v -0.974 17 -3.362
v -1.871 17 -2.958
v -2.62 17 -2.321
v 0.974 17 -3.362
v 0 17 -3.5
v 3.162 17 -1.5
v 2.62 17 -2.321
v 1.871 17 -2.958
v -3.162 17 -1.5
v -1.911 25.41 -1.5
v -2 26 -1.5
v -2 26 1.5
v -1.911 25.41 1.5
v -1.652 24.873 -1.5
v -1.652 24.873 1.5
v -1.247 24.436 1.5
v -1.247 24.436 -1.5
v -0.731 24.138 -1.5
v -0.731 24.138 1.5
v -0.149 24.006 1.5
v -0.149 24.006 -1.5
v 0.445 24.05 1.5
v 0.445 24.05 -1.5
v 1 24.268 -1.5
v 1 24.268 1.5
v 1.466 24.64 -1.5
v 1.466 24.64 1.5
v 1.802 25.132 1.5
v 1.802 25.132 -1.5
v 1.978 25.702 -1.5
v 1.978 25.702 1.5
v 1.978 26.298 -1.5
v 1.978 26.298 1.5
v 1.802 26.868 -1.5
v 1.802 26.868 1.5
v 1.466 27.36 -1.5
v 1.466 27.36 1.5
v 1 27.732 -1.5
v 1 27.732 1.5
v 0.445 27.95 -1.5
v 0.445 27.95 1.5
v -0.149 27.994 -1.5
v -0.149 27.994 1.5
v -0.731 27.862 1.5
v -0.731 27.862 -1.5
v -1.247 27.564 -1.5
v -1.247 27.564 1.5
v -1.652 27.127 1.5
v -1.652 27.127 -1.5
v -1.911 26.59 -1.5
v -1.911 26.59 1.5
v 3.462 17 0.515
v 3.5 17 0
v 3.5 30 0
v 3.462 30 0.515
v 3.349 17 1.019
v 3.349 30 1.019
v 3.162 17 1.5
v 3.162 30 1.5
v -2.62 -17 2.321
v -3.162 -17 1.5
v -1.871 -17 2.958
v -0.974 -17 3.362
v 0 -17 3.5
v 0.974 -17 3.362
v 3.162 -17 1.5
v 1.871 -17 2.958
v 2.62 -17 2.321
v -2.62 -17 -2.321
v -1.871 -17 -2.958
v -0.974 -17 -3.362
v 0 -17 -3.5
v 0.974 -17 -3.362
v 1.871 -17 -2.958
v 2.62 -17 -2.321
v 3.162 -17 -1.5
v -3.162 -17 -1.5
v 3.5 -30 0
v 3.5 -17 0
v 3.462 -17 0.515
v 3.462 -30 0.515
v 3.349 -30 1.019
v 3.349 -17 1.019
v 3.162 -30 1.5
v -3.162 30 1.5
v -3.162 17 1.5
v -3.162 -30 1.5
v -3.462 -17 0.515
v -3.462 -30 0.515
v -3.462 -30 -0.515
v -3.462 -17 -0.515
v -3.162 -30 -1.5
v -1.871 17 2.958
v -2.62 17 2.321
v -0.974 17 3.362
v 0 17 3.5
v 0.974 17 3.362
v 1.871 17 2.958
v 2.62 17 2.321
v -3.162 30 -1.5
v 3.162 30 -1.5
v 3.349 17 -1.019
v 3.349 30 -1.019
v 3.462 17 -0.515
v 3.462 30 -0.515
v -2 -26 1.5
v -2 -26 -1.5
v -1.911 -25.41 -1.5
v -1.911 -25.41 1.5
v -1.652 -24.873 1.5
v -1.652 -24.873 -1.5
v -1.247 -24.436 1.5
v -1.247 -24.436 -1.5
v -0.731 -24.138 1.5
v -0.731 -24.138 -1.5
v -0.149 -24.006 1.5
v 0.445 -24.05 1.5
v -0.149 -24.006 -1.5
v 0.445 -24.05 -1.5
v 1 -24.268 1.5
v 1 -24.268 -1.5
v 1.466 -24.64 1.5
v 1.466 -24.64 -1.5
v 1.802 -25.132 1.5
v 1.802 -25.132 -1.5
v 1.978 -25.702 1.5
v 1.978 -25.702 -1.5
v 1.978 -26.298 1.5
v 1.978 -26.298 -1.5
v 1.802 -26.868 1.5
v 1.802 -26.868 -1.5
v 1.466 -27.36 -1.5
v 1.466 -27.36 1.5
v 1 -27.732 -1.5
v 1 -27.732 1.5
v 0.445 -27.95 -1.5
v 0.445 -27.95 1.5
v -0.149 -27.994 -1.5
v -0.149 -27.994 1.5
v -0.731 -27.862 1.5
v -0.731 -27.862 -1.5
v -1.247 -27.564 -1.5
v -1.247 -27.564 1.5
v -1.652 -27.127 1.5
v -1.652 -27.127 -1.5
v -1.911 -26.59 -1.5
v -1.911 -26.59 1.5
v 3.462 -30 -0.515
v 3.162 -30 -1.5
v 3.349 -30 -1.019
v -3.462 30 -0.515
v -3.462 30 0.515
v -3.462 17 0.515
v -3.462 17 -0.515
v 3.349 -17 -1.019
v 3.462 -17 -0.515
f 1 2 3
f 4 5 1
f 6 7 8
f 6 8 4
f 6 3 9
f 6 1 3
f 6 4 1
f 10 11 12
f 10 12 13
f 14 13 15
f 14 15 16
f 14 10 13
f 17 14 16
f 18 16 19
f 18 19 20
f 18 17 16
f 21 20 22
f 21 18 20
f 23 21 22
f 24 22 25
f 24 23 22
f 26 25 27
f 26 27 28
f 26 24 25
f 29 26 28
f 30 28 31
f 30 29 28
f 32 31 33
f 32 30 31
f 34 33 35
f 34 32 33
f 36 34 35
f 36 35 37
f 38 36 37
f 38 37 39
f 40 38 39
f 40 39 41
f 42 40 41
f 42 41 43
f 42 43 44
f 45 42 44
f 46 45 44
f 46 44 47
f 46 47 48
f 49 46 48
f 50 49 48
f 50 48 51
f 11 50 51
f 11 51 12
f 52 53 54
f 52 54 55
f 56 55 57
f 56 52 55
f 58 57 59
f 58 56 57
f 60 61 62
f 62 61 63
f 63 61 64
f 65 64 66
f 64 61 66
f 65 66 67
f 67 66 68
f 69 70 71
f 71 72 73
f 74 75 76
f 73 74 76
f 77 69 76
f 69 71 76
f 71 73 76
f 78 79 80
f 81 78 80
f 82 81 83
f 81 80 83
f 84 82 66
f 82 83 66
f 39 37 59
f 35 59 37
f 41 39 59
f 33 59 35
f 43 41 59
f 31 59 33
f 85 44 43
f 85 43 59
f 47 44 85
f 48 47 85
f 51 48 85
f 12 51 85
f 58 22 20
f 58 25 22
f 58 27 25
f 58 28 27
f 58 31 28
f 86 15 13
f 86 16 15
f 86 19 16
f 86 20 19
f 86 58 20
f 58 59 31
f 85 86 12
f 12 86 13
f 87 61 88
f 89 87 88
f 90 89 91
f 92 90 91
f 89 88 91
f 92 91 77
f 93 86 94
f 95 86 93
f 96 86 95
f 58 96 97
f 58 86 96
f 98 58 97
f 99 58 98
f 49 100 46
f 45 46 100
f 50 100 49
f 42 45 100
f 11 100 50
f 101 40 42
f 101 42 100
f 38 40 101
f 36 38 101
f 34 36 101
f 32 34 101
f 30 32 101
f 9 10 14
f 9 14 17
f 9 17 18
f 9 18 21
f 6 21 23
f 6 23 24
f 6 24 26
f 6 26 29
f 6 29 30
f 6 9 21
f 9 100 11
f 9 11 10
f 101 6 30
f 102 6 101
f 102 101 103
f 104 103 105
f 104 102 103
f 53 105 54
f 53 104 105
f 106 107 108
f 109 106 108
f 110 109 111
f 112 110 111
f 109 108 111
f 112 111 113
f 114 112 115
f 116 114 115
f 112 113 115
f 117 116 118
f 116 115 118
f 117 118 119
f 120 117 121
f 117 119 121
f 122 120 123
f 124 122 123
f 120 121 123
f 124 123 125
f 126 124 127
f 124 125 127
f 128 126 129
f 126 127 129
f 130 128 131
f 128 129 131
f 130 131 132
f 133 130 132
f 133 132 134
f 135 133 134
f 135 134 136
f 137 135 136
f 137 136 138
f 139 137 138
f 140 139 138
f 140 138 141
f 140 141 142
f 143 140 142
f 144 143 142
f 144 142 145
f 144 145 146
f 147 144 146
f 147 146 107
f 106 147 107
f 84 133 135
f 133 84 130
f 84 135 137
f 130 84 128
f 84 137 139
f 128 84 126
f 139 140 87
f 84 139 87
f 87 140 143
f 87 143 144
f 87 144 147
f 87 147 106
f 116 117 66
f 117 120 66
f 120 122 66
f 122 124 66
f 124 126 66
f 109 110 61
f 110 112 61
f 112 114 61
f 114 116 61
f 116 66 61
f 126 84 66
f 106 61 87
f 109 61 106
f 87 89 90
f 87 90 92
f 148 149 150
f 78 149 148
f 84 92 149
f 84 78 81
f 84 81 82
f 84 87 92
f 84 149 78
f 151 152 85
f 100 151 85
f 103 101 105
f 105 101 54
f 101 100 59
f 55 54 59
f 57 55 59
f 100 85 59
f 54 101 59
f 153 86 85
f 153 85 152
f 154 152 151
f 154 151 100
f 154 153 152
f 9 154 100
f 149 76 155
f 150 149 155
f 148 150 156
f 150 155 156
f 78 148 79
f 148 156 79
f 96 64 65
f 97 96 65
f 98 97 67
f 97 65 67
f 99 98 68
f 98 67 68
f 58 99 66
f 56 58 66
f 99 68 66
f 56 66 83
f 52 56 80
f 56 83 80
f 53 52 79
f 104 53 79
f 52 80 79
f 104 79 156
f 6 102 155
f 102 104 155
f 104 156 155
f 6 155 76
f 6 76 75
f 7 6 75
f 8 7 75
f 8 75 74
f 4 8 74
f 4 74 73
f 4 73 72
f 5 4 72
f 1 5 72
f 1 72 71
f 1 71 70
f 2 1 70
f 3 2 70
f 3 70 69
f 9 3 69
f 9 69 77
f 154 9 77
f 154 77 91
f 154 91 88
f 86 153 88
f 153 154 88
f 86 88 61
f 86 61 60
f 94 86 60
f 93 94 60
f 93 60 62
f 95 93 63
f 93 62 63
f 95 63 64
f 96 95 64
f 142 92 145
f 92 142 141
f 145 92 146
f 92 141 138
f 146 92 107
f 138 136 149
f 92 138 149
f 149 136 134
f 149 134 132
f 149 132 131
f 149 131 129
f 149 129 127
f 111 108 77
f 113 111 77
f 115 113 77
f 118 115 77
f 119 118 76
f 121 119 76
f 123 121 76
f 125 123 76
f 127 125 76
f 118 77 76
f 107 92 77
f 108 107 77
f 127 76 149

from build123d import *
from build123d.topology import SkipClean

# Parameters (mm, degrees)
EXTRUDE_1_DEPTH      = 17
EXTRUDE_1_DEPTH_BACK = 17
SKETCH_1_R           = 3.5
EXTRUDE_2_DEPTH      = 13
CUT_EXTRUDE_1_REACH  = 32.615
SKETCH_5_R           = 2


with BuildPart() as part:
    # 草图1 → 凸台-拉伸1 (new, two sides: drawn at the far end of the back side and taken through both)
    with BuildSketch(Plane(origin=(0, 0, 0), x_dir=(1, 0, 0), z_dir=(0, 1, 0)).offset(-EXTRUDE_1_DEPTH_BACK)):
        Circle(SKETCH_1_R)
    extrude(amount=EXTRUDE_1_DEPTH + EXTRUDE_1_DEPTH_BACK)

    # 草图2 → 凸台-拉伸2 (add)
    with SkipClean():  # the faces are left unmerged after this step: merging them gives an invalid solid
        with BuildSketch(Plane.XZ.offset(17)):
            with BuildLine():
                Line((3.16227766, 1.5), (-3.16227766, 1.5))
                ThreePointArc((-3.16227766, 1.5), (-3.5, 0), (-3.16227766, -1.5))
                Line((-3.16227766, -1.5), (3.16227766, -1.5))
                ThreePointArc((3.16227766, -1.5), (3.414525722, -0.768774411), (3.5, 0))
                ThreePointArc((3.5, 0), (3.414525722, 0.768774411), (3.16227766, 1.5))
            make_face()
        extrude_2 = extrude(amount=EXTRUDE_2_DEPTH)

    # 草图5 → 切除-拉伸1 (cut, up to next)
    with BuildSketch(Plane(origin=(0, 0, -1.5), x_dir=(-1, 0, 0), z_dir=(0, 0, -1)), mode=Mode.PRIVATE) as cut_extrude_1_sk1:
        with Locations((0, -26)):
            Circle(SKETCH_5_R)
    cut_extrude_1_tool1 = extrude(cut_extrude_1_sk1.sketch, amount=-CUT_EXTRUDE_1_REACH, mode=Mode.PRIVATE) & part.part
    cut_extrude_1 = cut_extrude_1_tool1.solids().sort_by_distance((0, -26, -1.5))[0]
    add(cut_extrude_1, mode=Mode.SUBTRACT)

    # 镜向2: 凸台-拉伸2, 切除-拉伸1 across plane
    with SkipClean():  # the faces are left unmerged after this step: merging them gives an invalid solid
        add(extrude_2.mirror(Plane.ZX))
        add(cut_extrude_1.mirror(Plane.ZX), mode=Mode.SUBTRACT)


solid = part.part
